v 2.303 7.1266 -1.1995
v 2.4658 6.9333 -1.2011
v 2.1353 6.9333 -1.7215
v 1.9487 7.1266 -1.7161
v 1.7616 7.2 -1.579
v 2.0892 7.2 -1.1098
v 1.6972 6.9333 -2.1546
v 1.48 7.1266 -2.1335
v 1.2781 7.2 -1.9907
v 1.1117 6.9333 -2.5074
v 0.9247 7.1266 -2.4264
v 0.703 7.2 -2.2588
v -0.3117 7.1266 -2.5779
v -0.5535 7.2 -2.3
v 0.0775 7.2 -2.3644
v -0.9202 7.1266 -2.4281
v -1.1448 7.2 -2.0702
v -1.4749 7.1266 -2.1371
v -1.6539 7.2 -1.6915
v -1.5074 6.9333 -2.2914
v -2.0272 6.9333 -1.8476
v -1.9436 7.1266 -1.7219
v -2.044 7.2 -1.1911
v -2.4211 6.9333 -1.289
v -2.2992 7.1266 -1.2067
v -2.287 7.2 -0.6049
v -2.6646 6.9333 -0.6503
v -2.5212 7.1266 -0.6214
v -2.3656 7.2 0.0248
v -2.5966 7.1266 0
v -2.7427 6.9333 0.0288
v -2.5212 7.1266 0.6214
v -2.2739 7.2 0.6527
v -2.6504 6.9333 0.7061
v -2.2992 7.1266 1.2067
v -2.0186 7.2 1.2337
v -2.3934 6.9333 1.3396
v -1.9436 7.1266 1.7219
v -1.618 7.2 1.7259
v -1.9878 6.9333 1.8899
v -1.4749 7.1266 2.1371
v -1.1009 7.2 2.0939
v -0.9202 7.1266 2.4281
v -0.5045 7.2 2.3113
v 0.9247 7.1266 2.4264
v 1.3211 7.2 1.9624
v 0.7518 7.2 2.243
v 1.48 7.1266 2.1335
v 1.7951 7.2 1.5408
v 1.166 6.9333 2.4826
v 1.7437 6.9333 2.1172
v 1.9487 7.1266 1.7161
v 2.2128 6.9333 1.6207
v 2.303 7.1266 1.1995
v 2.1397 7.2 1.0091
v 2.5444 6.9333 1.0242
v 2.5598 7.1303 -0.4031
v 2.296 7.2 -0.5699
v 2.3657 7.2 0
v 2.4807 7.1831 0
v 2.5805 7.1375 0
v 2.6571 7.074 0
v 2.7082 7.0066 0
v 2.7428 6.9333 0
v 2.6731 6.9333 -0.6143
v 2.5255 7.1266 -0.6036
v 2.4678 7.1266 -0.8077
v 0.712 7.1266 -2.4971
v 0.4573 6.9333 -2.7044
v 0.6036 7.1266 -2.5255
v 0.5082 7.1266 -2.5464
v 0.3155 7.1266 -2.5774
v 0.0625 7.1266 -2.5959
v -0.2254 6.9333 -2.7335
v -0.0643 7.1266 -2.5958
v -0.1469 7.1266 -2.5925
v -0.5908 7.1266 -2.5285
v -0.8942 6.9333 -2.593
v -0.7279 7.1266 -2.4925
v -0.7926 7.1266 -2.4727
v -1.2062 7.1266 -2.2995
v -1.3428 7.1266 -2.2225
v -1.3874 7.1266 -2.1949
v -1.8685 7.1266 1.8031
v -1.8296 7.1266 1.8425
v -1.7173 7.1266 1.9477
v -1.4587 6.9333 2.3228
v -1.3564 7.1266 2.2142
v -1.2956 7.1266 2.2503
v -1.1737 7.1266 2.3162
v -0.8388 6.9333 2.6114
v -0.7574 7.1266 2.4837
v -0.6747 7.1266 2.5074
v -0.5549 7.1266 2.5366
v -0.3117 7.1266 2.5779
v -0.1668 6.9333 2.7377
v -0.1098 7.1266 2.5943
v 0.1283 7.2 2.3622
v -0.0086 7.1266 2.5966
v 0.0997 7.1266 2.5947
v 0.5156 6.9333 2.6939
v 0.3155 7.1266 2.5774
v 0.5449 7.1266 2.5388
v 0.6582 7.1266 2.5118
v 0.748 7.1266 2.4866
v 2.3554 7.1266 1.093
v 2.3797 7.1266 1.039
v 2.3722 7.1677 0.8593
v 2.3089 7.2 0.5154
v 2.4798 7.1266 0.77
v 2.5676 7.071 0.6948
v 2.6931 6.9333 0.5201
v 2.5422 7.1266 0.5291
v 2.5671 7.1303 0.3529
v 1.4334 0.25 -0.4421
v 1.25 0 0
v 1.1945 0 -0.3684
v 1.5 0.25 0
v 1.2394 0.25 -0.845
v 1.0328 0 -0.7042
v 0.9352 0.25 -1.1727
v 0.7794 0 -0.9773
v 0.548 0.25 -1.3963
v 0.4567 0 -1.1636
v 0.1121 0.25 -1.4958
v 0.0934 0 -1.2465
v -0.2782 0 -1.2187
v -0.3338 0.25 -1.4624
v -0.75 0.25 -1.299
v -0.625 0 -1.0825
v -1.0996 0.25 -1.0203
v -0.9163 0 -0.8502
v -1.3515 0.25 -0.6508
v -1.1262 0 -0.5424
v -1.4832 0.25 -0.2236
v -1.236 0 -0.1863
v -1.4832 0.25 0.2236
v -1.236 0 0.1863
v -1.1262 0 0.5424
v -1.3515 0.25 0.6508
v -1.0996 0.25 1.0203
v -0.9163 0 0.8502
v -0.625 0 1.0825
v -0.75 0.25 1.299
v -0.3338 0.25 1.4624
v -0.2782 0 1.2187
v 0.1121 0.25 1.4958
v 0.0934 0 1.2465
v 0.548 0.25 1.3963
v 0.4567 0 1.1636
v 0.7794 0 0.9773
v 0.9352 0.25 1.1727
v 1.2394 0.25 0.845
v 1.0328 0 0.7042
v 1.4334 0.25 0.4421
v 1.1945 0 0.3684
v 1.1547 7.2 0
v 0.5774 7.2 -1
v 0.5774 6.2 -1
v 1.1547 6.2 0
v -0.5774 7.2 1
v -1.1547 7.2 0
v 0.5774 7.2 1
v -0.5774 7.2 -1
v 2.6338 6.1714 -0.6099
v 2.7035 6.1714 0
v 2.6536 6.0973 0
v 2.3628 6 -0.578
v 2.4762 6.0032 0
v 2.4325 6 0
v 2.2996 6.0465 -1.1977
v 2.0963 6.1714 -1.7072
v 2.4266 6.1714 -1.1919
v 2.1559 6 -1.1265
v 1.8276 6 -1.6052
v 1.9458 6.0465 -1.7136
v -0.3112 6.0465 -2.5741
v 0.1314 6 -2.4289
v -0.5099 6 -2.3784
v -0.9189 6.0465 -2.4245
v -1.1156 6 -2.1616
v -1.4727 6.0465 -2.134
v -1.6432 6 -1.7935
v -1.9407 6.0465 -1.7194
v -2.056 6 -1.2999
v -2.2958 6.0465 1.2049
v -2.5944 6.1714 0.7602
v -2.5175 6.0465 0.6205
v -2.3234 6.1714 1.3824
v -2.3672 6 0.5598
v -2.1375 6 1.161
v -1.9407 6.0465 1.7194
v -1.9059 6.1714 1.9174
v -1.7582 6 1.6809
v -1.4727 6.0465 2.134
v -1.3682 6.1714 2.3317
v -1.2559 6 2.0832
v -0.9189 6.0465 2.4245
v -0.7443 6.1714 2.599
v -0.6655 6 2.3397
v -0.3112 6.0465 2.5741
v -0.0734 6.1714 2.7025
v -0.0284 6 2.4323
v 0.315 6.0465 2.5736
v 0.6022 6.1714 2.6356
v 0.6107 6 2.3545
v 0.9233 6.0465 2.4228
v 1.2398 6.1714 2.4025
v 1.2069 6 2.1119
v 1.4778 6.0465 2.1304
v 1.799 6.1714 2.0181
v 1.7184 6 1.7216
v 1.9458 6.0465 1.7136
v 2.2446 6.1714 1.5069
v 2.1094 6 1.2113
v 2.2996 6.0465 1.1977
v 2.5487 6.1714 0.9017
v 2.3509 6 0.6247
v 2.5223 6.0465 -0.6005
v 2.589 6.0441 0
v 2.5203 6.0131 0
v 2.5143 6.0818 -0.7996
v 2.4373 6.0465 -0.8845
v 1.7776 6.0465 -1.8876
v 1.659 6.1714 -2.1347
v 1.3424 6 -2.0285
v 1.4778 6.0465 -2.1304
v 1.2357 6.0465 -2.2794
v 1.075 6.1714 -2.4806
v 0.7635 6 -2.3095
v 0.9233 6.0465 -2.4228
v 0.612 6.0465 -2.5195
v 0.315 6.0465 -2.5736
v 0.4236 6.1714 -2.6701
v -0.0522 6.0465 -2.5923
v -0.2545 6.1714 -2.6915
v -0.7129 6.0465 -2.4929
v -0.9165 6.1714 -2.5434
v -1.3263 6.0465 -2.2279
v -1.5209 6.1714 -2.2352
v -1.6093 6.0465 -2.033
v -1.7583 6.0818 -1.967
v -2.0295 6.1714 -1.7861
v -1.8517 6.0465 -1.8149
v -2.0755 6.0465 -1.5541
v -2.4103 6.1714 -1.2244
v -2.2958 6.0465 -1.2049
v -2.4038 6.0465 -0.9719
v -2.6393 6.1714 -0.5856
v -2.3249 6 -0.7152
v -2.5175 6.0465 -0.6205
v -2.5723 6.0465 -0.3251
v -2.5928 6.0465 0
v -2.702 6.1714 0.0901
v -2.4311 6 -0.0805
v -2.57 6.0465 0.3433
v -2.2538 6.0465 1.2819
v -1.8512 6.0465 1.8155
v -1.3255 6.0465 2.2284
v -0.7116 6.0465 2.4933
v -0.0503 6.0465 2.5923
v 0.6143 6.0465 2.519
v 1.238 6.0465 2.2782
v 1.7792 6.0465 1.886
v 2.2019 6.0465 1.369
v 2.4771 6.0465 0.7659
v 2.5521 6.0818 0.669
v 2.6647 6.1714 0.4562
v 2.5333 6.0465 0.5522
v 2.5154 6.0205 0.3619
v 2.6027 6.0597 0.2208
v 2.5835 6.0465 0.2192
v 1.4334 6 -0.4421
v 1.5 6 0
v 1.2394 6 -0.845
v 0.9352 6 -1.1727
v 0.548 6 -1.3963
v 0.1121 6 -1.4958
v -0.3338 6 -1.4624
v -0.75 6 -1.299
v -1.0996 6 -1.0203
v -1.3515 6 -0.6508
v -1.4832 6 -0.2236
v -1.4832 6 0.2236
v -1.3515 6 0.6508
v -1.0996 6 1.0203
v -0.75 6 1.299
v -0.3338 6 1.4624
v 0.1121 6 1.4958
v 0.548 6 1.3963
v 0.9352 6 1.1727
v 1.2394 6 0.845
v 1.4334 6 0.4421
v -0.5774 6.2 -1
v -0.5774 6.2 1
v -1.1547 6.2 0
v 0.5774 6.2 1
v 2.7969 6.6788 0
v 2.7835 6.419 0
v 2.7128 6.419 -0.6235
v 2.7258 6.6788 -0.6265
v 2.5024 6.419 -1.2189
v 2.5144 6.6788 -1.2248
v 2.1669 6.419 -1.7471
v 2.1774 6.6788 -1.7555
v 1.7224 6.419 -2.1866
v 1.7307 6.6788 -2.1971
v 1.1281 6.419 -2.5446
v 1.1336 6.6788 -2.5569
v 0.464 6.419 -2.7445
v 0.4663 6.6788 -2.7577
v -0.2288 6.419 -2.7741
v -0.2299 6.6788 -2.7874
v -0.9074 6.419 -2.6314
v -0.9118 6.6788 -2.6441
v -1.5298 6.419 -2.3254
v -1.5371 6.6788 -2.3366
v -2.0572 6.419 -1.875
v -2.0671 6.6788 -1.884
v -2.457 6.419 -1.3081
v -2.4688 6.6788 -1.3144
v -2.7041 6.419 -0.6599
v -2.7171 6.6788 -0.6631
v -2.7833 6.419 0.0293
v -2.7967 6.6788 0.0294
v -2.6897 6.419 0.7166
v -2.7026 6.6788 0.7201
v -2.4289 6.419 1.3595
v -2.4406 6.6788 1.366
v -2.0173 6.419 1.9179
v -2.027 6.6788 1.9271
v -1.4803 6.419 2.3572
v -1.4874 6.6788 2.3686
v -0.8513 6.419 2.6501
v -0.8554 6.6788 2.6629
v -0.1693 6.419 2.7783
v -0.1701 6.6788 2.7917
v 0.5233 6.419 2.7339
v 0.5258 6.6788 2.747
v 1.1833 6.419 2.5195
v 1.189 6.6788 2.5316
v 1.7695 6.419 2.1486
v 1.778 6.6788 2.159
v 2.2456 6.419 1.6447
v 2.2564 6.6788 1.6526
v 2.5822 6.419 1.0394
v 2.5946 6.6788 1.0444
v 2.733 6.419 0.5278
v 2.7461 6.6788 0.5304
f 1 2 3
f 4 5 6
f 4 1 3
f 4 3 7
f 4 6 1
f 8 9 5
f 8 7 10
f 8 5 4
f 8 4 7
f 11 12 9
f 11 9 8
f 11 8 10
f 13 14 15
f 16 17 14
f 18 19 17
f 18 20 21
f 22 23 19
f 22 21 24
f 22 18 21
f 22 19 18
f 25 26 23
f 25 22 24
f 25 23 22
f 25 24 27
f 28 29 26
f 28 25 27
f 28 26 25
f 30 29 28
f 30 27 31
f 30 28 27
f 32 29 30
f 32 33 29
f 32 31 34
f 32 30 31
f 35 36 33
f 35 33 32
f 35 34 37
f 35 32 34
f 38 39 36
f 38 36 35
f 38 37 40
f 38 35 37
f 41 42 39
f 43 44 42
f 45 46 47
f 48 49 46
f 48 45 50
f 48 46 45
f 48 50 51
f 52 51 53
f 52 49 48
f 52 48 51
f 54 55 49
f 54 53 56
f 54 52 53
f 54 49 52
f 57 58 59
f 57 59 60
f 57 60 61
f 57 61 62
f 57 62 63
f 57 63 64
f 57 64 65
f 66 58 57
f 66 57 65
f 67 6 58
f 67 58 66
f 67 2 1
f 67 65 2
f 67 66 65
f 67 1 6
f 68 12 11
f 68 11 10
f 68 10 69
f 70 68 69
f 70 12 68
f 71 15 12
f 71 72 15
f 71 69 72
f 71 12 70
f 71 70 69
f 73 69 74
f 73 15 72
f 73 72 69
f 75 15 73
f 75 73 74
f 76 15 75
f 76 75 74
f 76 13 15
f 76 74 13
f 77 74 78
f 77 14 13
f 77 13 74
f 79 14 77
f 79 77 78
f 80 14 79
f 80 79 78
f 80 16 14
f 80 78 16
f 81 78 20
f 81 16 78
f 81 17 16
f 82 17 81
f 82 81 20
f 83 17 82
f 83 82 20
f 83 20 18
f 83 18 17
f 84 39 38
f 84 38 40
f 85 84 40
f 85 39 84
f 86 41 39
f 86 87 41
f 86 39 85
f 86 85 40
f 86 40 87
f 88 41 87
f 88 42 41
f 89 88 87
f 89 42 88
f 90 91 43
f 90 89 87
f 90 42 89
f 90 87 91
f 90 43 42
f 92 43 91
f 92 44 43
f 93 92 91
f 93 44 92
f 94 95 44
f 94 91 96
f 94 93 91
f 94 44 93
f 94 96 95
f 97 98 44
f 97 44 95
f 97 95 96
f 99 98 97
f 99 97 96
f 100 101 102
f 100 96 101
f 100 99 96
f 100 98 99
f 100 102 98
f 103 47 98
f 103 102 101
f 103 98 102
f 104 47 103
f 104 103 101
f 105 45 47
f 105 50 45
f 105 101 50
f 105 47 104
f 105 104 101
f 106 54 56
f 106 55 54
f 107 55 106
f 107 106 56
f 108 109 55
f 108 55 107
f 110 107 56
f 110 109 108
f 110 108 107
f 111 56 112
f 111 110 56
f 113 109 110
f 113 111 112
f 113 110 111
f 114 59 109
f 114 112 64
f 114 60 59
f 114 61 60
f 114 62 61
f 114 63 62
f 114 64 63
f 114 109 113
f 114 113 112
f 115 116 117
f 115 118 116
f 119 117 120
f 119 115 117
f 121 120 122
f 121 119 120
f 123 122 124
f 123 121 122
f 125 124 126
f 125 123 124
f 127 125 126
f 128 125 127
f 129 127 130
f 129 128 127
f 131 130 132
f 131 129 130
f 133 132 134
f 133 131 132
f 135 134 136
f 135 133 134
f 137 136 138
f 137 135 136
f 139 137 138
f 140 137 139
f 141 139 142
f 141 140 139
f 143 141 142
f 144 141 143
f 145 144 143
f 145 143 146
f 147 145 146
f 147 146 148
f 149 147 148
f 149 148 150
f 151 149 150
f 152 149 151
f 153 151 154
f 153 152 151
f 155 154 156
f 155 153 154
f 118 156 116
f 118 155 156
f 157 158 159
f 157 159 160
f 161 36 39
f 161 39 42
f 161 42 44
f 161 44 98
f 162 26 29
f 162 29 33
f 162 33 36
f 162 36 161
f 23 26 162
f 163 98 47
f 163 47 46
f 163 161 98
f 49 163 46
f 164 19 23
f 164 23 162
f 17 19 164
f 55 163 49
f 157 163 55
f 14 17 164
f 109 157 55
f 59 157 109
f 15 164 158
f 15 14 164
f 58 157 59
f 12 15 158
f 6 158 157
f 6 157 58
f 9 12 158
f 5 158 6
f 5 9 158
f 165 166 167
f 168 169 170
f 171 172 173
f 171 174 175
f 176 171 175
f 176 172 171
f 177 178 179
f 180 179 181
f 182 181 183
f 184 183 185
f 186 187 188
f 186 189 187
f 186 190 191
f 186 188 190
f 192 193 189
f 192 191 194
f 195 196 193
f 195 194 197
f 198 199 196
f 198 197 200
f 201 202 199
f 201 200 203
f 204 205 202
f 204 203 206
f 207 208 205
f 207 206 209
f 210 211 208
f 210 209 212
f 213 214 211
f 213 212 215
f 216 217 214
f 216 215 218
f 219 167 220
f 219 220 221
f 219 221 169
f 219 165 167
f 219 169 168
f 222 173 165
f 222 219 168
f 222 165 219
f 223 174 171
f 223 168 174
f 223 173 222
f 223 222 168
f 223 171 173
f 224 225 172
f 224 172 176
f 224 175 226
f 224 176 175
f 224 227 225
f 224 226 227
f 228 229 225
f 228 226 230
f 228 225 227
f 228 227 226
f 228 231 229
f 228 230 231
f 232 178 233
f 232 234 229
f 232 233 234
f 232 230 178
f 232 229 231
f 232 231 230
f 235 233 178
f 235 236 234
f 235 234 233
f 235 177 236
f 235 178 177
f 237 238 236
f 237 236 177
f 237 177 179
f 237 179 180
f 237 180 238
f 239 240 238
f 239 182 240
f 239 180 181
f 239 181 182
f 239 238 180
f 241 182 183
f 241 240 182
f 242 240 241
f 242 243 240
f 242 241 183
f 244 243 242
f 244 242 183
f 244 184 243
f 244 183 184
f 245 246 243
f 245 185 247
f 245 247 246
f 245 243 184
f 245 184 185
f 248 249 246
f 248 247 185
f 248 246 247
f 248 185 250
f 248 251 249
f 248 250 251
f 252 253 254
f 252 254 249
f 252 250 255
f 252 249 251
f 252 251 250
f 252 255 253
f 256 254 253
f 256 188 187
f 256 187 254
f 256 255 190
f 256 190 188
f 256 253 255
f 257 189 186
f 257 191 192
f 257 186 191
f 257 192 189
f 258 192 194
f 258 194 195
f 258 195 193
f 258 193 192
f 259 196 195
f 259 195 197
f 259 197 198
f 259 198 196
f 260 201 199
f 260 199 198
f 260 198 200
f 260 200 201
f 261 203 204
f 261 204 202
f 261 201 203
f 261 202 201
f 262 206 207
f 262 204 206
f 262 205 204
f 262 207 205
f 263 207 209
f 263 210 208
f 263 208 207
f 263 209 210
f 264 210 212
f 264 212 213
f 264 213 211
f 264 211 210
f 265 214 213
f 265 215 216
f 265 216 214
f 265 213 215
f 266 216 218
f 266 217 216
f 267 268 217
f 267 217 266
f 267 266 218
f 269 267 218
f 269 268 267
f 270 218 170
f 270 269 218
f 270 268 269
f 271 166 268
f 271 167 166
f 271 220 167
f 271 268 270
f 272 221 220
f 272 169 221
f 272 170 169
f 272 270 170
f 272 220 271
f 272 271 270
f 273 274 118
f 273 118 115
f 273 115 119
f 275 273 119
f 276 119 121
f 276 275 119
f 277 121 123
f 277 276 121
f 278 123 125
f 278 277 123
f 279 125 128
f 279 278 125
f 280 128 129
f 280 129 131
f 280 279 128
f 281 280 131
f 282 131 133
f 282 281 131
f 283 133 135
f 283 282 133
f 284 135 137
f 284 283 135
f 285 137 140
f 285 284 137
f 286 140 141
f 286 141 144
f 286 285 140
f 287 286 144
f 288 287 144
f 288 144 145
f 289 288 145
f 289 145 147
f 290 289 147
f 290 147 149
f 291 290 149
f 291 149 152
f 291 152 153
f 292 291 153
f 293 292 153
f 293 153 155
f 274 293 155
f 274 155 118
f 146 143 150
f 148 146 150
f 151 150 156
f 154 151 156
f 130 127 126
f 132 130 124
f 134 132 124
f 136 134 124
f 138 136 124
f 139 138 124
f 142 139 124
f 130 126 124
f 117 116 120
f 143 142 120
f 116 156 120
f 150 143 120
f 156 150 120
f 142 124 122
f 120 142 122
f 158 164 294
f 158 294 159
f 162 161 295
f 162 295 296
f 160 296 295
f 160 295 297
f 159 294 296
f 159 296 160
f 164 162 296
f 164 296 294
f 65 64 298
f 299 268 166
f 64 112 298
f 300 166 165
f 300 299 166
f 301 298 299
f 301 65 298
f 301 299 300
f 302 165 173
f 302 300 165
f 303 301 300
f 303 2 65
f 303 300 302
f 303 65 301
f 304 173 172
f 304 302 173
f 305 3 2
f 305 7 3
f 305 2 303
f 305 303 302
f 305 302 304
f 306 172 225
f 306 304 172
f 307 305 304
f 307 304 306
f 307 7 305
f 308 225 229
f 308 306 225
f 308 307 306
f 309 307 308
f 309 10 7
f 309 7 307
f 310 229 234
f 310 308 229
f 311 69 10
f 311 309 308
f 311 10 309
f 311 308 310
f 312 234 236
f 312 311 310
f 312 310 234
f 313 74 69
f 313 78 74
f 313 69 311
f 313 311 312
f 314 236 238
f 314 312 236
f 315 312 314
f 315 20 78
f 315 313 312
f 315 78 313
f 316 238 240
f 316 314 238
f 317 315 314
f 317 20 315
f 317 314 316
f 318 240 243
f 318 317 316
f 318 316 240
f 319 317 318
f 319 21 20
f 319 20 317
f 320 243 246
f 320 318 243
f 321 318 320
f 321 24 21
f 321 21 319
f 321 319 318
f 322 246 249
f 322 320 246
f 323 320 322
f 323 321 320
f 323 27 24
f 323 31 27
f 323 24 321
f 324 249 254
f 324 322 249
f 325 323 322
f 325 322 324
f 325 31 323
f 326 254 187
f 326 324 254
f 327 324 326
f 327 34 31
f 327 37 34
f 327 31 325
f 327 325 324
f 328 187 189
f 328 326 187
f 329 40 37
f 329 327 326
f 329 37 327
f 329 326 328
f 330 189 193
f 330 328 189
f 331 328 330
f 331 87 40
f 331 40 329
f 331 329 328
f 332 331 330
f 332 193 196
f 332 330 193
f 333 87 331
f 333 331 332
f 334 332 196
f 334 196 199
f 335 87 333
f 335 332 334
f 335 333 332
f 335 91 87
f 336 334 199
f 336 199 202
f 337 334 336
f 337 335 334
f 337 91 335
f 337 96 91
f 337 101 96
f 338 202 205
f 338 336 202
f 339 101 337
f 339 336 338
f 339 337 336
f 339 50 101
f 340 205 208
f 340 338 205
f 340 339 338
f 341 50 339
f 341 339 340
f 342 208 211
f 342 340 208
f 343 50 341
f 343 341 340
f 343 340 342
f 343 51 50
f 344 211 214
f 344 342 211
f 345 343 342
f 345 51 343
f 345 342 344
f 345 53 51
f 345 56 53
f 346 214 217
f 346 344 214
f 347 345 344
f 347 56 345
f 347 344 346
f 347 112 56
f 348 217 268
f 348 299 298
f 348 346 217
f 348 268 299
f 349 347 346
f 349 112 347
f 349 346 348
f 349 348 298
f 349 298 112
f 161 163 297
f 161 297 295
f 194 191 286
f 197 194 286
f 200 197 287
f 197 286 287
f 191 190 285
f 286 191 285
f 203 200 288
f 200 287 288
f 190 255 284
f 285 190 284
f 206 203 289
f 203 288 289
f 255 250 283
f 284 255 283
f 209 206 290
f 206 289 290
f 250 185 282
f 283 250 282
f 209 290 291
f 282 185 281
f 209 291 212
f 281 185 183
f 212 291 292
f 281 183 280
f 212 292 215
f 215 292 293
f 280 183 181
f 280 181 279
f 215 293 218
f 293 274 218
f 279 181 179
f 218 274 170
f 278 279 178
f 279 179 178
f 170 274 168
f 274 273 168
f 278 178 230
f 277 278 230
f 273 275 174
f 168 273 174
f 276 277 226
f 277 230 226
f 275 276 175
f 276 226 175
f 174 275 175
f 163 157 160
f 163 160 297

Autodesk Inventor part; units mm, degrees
ref_plane "YZ Plane" through (0, 0, 0) normal (1, 0, 0) x (0, 1, 0)
ref_plane "XZ Plane" through (0, 0, 0) normal (0, 1, 0) x (-1, 0, 0)
ref_plane "XY Plane" through (0, 0, 0) normal (0, 0, 1) x (1, 0, 0)
sketch "スケッチ1" plane through (0, 0, 0) normal (0, 0, 1) x (1, 0, 0)
  line L0 (0, 0) -> (1.5, 0)
  line L1 (1.5, 0) -> (1.5, 6)
  line L2 (1.5, 6) -> (2.6, 6)
  line L3 (2.6, 6) -> (2.6, 7.2) construction
  line L4 (2.6, 7.2) -> (0, 7.2)
  line L5 (0, 7.2) -> (0, 0)
  line L6 (0, -5.542) -> (0, 0) construction
  arc A0 (2.6, 6) -> (2.6, 7.2) centre (1.8, 6.6) ccw
  line L7 (2.8, 9.0711) -> (2.8, 6.853) construction
  dimension "d0" = 3
  dimension "d1" = 6
  dimension "d2" = 5.2
  dimension "d3" = 1.2
  dimension "d13" = 5.6
revolve "回転1" add sketch "スケッチ1" angle 360 about axis through (0, -5.542, 0) along (0, 1, 0)
sketch "スケッチ2" plane through (0, 7.2, 0) normal (0, 1, 0) x (1, 0, 0)
  line L0 (1.1547, 0) -> (0.5774, -1)
  line L1 (0.5774, -1) -> (-0.5774, -1)
  line L2 (-0.5774, -1) -> (-1.1547, 0)
  line L3 (-1.1547, 0) -> (-0.5774, 1)
  line L4 (-0.5774, 1) -> (0.5774, 1)
  line L5 (0.5774, 1) -> (1.1547, 0)
  line L6 (1.1547, 0) -> (-1.1547, 0) construction
  point P0 (0, 0)
  point P1 (0, 0)
  dimension "d5" = 2
extrude "押し出し1" cut sketch "スケッチ2" against normal blind 1
fillet "フィレット1" radius 0.4 1 edges at (-2.6, 7.2, 0)
fillet "フィレット1" radius 0.3 1 edges at (-2.6, 6, 0)
chamfer "面取り1" distance 0.25 angle 45 1 edges at (-1.5, 0, 0)
properties part number "10_051_LOW_HEAD_CAP_BOLT_M3X6_R1"
